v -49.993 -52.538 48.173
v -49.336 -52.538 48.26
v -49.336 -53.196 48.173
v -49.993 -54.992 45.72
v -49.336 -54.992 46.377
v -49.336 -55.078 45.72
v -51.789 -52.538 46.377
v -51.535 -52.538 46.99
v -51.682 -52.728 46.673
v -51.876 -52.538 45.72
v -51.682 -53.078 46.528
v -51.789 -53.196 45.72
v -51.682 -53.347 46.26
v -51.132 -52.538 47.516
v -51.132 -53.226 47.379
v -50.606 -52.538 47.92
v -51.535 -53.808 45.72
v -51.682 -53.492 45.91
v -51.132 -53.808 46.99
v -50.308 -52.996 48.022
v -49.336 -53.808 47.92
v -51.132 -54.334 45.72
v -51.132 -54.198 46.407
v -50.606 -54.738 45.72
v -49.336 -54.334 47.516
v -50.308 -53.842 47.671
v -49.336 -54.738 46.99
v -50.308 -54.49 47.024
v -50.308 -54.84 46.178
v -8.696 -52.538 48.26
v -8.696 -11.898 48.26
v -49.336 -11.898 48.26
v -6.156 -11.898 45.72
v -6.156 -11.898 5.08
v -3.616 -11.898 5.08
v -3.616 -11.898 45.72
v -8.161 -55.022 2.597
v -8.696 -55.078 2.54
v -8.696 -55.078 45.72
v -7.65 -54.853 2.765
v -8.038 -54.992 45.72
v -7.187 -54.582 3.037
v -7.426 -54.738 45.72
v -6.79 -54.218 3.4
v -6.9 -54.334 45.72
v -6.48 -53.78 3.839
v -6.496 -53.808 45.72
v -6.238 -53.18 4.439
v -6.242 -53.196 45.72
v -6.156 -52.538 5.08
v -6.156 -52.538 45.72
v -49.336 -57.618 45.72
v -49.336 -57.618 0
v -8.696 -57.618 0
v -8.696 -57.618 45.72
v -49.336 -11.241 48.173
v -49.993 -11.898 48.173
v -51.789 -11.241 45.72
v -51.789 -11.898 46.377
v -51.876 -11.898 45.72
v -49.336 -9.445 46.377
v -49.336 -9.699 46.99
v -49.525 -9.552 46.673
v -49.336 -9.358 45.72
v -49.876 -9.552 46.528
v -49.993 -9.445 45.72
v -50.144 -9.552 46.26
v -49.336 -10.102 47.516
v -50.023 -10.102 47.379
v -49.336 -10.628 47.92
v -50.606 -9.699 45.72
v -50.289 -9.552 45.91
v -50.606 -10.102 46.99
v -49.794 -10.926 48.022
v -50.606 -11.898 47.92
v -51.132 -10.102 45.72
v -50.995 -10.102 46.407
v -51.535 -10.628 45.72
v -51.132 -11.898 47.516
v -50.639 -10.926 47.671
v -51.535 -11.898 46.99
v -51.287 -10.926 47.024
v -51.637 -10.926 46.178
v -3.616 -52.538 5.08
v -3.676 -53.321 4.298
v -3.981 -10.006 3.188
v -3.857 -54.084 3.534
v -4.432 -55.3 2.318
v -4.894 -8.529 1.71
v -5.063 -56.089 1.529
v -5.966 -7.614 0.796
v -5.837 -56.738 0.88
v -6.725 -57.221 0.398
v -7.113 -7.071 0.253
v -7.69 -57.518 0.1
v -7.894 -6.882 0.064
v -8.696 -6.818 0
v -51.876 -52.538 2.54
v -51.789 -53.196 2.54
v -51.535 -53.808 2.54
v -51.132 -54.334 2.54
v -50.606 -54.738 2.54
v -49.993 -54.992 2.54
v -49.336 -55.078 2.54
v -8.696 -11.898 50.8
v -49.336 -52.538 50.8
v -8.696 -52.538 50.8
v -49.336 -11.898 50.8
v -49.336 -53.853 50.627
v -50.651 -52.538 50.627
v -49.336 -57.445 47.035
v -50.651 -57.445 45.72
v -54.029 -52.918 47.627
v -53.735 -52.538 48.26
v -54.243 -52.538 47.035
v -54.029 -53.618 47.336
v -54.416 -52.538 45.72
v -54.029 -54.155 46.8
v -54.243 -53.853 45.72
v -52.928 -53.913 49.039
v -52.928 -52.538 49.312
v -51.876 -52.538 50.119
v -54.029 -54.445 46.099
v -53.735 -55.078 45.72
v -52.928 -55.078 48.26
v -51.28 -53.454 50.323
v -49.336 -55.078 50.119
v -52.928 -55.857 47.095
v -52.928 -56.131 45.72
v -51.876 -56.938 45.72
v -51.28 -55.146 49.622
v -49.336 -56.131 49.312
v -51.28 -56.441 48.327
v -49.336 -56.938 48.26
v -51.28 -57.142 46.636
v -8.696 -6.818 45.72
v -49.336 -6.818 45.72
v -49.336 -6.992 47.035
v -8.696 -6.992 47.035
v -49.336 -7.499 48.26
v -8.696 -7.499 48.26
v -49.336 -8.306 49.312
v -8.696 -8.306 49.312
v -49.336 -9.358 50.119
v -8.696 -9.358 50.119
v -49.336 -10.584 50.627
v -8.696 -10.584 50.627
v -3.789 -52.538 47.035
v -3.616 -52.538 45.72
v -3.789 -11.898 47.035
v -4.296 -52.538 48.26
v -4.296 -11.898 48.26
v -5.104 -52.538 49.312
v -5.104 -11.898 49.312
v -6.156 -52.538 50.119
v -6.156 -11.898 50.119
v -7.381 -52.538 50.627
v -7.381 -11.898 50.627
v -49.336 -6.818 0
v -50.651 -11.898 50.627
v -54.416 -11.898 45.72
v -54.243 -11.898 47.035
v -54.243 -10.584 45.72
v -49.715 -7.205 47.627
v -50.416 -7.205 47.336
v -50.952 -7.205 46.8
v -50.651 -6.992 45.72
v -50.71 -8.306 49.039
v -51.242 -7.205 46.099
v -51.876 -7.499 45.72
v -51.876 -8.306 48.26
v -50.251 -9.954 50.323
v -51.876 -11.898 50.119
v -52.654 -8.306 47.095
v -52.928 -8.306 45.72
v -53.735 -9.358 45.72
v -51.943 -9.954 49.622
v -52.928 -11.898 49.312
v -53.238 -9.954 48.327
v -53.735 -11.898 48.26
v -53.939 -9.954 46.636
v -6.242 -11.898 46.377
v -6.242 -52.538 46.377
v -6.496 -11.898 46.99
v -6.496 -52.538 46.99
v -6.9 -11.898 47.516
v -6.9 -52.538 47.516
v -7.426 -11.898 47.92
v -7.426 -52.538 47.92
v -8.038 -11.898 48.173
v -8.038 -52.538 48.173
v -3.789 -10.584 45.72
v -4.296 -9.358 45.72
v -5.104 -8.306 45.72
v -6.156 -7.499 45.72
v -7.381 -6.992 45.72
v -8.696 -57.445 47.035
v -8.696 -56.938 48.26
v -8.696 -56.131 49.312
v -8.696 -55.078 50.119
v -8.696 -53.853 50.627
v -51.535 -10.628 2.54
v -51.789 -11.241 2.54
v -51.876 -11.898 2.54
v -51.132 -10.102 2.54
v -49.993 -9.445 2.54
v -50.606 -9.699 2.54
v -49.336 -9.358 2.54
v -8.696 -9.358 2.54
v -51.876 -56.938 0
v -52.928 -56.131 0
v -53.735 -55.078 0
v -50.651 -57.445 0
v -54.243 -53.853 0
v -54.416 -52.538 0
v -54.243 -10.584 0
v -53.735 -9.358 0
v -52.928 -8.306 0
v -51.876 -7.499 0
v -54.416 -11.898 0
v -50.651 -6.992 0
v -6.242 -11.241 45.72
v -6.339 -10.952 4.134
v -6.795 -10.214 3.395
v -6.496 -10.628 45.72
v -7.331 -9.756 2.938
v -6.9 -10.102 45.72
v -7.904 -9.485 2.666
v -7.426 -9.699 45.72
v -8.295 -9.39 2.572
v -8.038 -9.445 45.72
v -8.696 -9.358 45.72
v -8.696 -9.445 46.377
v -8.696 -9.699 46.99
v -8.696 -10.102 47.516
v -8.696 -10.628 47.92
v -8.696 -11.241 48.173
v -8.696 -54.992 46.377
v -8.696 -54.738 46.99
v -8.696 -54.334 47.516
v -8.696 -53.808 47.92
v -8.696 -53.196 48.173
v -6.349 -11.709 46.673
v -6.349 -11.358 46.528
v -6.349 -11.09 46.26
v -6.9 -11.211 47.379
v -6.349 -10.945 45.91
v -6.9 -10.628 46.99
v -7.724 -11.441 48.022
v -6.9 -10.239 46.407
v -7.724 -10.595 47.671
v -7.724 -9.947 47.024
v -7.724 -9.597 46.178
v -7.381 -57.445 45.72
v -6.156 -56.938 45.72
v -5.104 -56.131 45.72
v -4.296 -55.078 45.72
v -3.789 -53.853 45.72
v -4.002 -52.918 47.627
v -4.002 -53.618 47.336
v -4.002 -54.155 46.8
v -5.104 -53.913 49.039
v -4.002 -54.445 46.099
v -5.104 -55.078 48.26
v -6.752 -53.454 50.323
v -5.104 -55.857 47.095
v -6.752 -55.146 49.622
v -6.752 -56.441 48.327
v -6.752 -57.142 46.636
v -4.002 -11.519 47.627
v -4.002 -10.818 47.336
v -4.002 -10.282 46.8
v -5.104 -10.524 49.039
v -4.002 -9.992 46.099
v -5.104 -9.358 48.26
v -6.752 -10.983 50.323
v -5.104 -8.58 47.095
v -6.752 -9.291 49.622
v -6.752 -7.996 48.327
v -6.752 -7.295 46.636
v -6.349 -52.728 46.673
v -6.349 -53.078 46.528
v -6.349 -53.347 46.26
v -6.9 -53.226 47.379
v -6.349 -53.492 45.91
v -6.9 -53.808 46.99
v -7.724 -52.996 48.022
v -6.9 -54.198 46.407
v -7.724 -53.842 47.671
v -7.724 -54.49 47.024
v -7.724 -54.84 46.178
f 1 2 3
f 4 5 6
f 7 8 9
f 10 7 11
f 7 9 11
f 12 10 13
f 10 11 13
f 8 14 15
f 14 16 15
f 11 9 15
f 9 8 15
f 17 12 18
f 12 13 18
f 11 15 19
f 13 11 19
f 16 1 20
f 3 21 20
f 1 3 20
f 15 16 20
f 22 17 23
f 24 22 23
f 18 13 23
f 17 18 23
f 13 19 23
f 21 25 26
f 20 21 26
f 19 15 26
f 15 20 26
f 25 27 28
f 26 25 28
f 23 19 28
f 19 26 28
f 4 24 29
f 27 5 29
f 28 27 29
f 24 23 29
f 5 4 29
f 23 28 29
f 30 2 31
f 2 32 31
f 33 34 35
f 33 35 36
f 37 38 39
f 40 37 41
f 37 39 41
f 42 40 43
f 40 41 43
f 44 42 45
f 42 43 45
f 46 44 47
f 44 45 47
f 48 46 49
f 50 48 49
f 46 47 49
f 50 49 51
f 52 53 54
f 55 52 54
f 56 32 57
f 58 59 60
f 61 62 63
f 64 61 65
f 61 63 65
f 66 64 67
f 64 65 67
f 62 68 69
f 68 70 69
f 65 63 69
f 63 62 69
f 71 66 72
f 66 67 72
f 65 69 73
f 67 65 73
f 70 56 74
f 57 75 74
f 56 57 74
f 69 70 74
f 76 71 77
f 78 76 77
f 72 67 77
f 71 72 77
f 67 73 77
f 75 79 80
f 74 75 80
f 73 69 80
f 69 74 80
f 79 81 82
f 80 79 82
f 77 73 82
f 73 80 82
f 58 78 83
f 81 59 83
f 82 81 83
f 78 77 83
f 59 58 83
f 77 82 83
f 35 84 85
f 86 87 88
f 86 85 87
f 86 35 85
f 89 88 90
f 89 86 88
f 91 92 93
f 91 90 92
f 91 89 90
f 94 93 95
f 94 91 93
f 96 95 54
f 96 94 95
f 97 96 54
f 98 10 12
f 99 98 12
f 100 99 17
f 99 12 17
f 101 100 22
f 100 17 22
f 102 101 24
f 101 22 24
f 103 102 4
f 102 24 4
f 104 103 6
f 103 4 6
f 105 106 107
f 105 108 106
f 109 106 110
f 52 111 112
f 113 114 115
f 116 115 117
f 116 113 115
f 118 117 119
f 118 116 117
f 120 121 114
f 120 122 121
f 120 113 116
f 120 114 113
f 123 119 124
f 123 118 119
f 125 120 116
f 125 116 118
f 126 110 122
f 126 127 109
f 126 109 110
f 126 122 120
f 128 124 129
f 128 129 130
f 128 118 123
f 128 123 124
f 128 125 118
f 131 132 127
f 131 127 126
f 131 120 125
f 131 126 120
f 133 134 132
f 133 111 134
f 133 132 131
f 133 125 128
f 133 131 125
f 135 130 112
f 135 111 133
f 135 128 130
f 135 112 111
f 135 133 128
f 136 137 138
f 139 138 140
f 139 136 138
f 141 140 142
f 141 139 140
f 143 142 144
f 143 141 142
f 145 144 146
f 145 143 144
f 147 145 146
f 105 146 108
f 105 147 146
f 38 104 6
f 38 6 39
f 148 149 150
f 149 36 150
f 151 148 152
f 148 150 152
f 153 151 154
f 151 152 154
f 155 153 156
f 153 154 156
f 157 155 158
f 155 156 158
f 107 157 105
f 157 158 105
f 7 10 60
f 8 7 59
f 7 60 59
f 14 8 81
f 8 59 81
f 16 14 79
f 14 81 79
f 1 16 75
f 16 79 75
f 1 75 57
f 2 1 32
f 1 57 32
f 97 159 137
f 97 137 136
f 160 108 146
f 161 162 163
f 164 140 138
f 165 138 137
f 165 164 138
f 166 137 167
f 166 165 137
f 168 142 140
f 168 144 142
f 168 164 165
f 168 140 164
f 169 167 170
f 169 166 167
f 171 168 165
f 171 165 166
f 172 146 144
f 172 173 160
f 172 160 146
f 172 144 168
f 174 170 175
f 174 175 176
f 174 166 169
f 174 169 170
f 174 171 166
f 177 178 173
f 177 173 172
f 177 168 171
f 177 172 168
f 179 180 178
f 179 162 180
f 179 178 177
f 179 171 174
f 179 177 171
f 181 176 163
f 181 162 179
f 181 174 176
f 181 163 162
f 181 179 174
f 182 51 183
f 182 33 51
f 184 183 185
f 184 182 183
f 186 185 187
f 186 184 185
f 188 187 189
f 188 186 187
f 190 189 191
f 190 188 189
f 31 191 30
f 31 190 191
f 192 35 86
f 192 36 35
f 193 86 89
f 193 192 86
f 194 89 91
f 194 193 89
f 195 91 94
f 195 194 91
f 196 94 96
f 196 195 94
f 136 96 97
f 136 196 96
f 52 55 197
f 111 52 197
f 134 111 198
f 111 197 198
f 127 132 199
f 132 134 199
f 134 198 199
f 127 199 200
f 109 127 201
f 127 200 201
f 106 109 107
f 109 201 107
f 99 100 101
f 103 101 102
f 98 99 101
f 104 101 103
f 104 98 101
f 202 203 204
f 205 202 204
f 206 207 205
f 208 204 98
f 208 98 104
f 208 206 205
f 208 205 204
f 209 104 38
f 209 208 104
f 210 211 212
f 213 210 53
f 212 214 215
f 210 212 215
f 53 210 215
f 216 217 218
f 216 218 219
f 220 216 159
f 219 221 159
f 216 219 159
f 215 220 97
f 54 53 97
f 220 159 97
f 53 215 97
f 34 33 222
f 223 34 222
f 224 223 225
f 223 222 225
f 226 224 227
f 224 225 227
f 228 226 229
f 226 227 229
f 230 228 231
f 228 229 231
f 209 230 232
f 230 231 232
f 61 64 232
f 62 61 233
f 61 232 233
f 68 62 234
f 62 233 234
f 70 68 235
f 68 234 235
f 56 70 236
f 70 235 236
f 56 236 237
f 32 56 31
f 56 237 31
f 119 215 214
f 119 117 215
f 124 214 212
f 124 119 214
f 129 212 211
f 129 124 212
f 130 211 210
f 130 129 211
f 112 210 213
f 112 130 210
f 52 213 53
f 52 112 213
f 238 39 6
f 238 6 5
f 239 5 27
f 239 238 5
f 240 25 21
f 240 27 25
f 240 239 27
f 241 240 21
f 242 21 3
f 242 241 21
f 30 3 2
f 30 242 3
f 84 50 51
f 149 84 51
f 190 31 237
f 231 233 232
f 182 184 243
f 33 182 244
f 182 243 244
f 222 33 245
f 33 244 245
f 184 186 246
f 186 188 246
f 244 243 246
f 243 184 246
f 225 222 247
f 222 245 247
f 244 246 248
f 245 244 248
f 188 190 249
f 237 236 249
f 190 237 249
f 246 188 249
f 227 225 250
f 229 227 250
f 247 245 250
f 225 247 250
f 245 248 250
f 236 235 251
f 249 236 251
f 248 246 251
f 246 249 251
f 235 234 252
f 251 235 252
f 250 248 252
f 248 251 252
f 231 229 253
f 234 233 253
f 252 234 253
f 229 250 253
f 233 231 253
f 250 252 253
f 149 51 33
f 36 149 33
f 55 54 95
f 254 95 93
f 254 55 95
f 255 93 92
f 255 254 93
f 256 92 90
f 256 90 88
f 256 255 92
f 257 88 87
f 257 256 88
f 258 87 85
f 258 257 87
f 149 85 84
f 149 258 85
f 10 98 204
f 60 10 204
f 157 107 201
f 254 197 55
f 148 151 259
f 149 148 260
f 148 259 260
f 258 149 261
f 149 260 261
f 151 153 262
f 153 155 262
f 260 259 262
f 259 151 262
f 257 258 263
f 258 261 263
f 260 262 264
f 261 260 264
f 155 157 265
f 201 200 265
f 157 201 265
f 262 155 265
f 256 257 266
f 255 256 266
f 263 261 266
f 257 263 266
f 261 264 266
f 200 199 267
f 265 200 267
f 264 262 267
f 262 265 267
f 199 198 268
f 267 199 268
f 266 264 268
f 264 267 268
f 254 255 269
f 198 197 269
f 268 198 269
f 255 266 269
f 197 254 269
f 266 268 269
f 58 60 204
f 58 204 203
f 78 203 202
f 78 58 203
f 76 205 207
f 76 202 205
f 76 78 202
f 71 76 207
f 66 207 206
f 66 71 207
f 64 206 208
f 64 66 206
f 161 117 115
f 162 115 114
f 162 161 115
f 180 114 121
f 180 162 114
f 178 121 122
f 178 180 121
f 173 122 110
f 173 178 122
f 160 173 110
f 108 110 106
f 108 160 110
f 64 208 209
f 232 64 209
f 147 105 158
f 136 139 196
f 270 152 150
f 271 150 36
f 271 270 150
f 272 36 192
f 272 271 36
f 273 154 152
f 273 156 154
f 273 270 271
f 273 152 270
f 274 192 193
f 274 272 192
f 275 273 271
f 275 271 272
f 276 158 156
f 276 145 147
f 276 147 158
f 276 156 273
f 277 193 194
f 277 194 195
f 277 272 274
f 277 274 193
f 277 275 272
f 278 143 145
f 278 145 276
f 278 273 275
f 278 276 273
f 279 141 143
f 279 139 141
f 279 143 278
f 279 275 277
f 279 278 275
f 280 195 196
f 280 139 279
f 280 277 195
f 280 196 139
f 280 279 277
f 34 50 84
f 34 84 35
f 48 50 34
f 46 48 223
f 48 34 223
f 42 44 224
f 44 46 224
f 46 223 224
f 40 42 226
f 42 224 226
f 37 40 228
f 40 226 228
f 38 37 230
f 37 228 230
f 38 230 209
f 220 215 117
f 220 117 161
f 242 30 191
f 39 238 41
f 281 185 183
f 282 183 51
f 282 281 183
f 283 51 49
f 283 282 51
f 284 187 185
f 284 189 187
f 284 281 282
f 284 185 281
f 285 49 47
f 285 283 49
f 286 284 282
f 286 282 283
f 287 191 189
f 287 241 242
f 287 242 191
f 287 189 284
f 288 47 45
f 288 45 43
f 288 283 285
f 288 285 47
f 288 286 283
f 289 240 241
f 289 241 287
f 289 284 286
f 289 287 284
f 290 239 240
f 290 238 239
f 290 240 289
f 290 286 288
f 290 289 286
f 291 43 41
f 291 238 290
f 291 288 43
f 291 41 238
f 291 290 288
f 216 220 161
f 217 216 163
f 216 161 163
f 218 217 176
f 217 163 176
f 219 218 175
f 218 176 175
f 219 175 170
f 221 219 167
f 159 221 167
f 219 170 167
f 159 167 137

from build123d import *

# Parameters (mm, degrees)
F0_W     = 50.8
F0_H     = 50.8
F1_DEPTH = 50.8
F3_R     = 5.08
F4_T     = -2.54


# Not quite as in the source:
# - a shell that OpenCascade refuses in one call is made with other operations: the cavity is built on its own and cut out


with BuildPart() as f1:
    # F0 (on Top) → F1 (new body)
    with BuildSketch(Plane.XY):
        with Locations((-29.015717721, -32.2184429228)):
            Rectangle(F0_W, F0_H)
    extrude(amount=F1_DEPTH)

    # F3
    f3_edges = [f1.edges().sort_by_distance(p)[0] for p in [
        (-29.015718, -57.618443, 50.8),
        (-54.415718, -32.218443, 50.8),
        (-29.015718, -6.818443, 50.8),
        (-3.615718, -32.218443, 50.8),
        (-54.415718, -57.618443, 25.4),
        (-54.415718, -6.818443, 25.4),
        (-3.615718, -6.818443, 25.4),
        (-3.615718, -57.618443, 25.4),
        (-3.615718, -32.218443, 0),
    ]]
    fillet(f3_edges, radius=F3_R)

    # F4: a shell. OpenCascade refuses it in one call, so the cavity is built on its own and cut out:
    # the body offset inwards by the wall thickness, plus a prism from it out through each open face.
    f4_core = offset(f1.part, amount=F4_T, mode=Mode.PRIVATE)
    f4_exits = [f4_core.faces().sort_by_distance(p)[0] for p in [
        (-6.155718, -32.218443, 25.4),
    ]]
    add(f4_core, mode=Mode.SUBTRACT)
    extrude(f4_exits, amount=-F4_T, mode=Mode.SUBTRACT)


solid = f1.part
